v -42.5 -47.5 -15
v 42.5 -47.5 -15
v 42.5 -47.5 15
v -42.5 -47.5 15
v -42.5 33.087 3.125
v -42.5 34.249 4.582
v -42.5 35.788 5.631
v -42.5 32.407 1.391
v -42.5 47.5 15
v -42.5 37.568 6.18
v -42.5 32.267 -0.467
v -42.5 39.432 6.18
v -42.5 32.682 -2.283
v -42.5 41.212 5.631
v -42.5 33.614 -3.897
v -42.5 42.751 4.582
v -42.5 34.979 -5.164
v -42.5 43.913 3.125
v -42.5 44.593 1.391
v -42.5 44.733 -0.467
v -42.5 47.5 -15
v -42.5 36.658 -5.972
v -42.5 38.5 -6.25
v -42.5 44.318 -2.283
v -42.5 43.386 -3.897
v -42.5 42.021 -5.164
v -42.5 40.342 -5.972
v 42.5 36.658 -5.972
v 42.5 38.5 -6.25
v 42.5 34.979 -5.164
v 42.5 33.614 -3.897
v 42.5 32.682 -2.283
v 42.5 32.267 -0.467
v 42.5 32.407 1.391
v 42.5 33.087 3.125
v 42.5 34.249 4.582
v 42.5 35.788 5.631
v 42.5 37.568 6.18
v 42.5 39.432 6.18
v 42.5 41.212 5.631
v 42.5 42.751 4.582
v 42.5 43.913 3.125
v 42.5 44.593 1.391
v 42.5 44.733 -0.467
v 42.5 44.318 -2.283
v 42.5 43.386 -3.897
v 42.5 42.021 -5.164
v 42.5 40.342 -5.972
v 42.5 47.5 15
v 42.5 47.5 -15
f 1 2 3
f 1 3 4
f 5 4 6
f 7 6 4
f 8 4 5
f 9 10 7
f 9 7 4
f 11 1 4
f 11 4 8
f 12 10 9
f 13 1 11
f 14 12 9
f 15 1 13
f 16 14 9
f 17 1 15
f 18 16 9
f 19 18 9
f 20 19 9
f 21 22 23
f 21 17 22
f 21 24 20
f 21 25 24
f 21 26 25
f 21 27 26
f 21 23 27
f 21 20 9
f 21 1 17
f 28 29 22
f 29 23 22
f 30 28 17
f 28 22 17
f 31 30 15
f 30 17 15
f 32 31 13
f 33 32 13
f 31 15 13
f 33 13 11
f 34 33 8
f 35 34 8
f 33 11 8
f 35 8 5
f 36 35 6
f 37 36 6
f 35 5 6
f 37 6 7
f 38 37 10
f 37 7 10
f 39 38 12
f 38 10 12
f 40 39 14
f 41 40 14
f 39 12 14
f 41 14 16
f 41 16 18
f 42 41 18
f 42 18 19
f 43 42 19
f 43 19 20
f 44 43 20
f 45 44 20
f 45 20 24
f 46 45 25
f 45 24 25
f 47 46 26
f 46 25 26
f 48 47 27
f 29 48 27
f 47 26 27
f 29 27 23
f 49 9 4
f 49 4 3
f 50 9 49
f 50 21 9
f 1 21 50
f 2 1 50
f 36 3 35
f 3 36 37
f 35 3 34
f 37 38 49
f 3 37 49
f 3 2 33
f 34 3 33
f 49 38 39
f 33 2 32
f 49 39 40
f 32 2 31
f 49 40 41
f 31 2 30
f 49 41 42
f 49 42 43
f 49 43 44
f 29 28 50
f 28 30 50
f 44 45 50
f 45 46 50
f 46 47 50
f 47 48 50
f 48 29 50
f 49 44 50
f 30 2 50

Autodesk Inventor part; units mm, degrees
ref_plane "YZ Plane" through (0, 0, 0) normal (1, 0, 0) x (0, 1, 0)
ref_plane "XZ Plane" through (0, 0, 0) normal (0, 1, 0) x (-1, 0, 0)
ref_plane "XY Plane" through (0, 0, 0) normal (0, 0, 1) x (1, 0, 0)
sketch "Esboço1" plane through (0, 0, 0) normal (0, 0, 1) x (1, 0, 0)
  circle A0 centre (0, 0) radius 68 construction
  line L0 (-42.5, 47.5) -> (42.5, 47.5)
  line L1 (42.5, -27.5) -> (42.5, -47.5)
  line L2 (42.5, -47.5) -> (-42.5, -47.5)
  line L3 (-42.5, -47.5) -> (-42.5, -27.5)
  line L4 (-42.5, 47.5) -> (42.5, -47.5) construction
  line L5 (42.5, 47.5) -> (-42.5, -47.5) construction
  line L6 (-42.5, -27.5) -> (-42.5, -12.5)
  line L7 (-42.5, -12.5) -> (-42.5, 47.5)
  line L8 (0, 106.3715) -> (0, -163.339) construction
  line L9 (42.5, -27.5) -> (42.5, -12.5)
  line L10 (42.5, -12.5) -> (42.5, 47.5)
  dimension "d0" = 136
  dimension "d1" = 85
  dimension "d2" = 95
  dimension "d13" = 20
  dimension "d14" = 60
  dimension "d15" = 42.5
extrude "Extrusão1" add sketch "Esboço1" along normal mid plane 30
sketch "Esboço2" plane through (42.5, -47.5, 15) normal (1, 0, 0) x (0, 0, -1)
  line L0 (30, 95) -> (0, 95) construction
  line L1 (15, 95) -> (15, 0) construction
  line L2 (30, 0) -> (0, 0) construction
  circle A0 centre (15, 86) radius 6.472 construction
  point P0 (15, 47.5)
  dimension "d5" = 9
hole "Furo1" at (42.5, 38.5, 0) direction (-1, 0, 0) diameter 12.5 end through all
properties part number "suporteGuiaCentralRetangular"
